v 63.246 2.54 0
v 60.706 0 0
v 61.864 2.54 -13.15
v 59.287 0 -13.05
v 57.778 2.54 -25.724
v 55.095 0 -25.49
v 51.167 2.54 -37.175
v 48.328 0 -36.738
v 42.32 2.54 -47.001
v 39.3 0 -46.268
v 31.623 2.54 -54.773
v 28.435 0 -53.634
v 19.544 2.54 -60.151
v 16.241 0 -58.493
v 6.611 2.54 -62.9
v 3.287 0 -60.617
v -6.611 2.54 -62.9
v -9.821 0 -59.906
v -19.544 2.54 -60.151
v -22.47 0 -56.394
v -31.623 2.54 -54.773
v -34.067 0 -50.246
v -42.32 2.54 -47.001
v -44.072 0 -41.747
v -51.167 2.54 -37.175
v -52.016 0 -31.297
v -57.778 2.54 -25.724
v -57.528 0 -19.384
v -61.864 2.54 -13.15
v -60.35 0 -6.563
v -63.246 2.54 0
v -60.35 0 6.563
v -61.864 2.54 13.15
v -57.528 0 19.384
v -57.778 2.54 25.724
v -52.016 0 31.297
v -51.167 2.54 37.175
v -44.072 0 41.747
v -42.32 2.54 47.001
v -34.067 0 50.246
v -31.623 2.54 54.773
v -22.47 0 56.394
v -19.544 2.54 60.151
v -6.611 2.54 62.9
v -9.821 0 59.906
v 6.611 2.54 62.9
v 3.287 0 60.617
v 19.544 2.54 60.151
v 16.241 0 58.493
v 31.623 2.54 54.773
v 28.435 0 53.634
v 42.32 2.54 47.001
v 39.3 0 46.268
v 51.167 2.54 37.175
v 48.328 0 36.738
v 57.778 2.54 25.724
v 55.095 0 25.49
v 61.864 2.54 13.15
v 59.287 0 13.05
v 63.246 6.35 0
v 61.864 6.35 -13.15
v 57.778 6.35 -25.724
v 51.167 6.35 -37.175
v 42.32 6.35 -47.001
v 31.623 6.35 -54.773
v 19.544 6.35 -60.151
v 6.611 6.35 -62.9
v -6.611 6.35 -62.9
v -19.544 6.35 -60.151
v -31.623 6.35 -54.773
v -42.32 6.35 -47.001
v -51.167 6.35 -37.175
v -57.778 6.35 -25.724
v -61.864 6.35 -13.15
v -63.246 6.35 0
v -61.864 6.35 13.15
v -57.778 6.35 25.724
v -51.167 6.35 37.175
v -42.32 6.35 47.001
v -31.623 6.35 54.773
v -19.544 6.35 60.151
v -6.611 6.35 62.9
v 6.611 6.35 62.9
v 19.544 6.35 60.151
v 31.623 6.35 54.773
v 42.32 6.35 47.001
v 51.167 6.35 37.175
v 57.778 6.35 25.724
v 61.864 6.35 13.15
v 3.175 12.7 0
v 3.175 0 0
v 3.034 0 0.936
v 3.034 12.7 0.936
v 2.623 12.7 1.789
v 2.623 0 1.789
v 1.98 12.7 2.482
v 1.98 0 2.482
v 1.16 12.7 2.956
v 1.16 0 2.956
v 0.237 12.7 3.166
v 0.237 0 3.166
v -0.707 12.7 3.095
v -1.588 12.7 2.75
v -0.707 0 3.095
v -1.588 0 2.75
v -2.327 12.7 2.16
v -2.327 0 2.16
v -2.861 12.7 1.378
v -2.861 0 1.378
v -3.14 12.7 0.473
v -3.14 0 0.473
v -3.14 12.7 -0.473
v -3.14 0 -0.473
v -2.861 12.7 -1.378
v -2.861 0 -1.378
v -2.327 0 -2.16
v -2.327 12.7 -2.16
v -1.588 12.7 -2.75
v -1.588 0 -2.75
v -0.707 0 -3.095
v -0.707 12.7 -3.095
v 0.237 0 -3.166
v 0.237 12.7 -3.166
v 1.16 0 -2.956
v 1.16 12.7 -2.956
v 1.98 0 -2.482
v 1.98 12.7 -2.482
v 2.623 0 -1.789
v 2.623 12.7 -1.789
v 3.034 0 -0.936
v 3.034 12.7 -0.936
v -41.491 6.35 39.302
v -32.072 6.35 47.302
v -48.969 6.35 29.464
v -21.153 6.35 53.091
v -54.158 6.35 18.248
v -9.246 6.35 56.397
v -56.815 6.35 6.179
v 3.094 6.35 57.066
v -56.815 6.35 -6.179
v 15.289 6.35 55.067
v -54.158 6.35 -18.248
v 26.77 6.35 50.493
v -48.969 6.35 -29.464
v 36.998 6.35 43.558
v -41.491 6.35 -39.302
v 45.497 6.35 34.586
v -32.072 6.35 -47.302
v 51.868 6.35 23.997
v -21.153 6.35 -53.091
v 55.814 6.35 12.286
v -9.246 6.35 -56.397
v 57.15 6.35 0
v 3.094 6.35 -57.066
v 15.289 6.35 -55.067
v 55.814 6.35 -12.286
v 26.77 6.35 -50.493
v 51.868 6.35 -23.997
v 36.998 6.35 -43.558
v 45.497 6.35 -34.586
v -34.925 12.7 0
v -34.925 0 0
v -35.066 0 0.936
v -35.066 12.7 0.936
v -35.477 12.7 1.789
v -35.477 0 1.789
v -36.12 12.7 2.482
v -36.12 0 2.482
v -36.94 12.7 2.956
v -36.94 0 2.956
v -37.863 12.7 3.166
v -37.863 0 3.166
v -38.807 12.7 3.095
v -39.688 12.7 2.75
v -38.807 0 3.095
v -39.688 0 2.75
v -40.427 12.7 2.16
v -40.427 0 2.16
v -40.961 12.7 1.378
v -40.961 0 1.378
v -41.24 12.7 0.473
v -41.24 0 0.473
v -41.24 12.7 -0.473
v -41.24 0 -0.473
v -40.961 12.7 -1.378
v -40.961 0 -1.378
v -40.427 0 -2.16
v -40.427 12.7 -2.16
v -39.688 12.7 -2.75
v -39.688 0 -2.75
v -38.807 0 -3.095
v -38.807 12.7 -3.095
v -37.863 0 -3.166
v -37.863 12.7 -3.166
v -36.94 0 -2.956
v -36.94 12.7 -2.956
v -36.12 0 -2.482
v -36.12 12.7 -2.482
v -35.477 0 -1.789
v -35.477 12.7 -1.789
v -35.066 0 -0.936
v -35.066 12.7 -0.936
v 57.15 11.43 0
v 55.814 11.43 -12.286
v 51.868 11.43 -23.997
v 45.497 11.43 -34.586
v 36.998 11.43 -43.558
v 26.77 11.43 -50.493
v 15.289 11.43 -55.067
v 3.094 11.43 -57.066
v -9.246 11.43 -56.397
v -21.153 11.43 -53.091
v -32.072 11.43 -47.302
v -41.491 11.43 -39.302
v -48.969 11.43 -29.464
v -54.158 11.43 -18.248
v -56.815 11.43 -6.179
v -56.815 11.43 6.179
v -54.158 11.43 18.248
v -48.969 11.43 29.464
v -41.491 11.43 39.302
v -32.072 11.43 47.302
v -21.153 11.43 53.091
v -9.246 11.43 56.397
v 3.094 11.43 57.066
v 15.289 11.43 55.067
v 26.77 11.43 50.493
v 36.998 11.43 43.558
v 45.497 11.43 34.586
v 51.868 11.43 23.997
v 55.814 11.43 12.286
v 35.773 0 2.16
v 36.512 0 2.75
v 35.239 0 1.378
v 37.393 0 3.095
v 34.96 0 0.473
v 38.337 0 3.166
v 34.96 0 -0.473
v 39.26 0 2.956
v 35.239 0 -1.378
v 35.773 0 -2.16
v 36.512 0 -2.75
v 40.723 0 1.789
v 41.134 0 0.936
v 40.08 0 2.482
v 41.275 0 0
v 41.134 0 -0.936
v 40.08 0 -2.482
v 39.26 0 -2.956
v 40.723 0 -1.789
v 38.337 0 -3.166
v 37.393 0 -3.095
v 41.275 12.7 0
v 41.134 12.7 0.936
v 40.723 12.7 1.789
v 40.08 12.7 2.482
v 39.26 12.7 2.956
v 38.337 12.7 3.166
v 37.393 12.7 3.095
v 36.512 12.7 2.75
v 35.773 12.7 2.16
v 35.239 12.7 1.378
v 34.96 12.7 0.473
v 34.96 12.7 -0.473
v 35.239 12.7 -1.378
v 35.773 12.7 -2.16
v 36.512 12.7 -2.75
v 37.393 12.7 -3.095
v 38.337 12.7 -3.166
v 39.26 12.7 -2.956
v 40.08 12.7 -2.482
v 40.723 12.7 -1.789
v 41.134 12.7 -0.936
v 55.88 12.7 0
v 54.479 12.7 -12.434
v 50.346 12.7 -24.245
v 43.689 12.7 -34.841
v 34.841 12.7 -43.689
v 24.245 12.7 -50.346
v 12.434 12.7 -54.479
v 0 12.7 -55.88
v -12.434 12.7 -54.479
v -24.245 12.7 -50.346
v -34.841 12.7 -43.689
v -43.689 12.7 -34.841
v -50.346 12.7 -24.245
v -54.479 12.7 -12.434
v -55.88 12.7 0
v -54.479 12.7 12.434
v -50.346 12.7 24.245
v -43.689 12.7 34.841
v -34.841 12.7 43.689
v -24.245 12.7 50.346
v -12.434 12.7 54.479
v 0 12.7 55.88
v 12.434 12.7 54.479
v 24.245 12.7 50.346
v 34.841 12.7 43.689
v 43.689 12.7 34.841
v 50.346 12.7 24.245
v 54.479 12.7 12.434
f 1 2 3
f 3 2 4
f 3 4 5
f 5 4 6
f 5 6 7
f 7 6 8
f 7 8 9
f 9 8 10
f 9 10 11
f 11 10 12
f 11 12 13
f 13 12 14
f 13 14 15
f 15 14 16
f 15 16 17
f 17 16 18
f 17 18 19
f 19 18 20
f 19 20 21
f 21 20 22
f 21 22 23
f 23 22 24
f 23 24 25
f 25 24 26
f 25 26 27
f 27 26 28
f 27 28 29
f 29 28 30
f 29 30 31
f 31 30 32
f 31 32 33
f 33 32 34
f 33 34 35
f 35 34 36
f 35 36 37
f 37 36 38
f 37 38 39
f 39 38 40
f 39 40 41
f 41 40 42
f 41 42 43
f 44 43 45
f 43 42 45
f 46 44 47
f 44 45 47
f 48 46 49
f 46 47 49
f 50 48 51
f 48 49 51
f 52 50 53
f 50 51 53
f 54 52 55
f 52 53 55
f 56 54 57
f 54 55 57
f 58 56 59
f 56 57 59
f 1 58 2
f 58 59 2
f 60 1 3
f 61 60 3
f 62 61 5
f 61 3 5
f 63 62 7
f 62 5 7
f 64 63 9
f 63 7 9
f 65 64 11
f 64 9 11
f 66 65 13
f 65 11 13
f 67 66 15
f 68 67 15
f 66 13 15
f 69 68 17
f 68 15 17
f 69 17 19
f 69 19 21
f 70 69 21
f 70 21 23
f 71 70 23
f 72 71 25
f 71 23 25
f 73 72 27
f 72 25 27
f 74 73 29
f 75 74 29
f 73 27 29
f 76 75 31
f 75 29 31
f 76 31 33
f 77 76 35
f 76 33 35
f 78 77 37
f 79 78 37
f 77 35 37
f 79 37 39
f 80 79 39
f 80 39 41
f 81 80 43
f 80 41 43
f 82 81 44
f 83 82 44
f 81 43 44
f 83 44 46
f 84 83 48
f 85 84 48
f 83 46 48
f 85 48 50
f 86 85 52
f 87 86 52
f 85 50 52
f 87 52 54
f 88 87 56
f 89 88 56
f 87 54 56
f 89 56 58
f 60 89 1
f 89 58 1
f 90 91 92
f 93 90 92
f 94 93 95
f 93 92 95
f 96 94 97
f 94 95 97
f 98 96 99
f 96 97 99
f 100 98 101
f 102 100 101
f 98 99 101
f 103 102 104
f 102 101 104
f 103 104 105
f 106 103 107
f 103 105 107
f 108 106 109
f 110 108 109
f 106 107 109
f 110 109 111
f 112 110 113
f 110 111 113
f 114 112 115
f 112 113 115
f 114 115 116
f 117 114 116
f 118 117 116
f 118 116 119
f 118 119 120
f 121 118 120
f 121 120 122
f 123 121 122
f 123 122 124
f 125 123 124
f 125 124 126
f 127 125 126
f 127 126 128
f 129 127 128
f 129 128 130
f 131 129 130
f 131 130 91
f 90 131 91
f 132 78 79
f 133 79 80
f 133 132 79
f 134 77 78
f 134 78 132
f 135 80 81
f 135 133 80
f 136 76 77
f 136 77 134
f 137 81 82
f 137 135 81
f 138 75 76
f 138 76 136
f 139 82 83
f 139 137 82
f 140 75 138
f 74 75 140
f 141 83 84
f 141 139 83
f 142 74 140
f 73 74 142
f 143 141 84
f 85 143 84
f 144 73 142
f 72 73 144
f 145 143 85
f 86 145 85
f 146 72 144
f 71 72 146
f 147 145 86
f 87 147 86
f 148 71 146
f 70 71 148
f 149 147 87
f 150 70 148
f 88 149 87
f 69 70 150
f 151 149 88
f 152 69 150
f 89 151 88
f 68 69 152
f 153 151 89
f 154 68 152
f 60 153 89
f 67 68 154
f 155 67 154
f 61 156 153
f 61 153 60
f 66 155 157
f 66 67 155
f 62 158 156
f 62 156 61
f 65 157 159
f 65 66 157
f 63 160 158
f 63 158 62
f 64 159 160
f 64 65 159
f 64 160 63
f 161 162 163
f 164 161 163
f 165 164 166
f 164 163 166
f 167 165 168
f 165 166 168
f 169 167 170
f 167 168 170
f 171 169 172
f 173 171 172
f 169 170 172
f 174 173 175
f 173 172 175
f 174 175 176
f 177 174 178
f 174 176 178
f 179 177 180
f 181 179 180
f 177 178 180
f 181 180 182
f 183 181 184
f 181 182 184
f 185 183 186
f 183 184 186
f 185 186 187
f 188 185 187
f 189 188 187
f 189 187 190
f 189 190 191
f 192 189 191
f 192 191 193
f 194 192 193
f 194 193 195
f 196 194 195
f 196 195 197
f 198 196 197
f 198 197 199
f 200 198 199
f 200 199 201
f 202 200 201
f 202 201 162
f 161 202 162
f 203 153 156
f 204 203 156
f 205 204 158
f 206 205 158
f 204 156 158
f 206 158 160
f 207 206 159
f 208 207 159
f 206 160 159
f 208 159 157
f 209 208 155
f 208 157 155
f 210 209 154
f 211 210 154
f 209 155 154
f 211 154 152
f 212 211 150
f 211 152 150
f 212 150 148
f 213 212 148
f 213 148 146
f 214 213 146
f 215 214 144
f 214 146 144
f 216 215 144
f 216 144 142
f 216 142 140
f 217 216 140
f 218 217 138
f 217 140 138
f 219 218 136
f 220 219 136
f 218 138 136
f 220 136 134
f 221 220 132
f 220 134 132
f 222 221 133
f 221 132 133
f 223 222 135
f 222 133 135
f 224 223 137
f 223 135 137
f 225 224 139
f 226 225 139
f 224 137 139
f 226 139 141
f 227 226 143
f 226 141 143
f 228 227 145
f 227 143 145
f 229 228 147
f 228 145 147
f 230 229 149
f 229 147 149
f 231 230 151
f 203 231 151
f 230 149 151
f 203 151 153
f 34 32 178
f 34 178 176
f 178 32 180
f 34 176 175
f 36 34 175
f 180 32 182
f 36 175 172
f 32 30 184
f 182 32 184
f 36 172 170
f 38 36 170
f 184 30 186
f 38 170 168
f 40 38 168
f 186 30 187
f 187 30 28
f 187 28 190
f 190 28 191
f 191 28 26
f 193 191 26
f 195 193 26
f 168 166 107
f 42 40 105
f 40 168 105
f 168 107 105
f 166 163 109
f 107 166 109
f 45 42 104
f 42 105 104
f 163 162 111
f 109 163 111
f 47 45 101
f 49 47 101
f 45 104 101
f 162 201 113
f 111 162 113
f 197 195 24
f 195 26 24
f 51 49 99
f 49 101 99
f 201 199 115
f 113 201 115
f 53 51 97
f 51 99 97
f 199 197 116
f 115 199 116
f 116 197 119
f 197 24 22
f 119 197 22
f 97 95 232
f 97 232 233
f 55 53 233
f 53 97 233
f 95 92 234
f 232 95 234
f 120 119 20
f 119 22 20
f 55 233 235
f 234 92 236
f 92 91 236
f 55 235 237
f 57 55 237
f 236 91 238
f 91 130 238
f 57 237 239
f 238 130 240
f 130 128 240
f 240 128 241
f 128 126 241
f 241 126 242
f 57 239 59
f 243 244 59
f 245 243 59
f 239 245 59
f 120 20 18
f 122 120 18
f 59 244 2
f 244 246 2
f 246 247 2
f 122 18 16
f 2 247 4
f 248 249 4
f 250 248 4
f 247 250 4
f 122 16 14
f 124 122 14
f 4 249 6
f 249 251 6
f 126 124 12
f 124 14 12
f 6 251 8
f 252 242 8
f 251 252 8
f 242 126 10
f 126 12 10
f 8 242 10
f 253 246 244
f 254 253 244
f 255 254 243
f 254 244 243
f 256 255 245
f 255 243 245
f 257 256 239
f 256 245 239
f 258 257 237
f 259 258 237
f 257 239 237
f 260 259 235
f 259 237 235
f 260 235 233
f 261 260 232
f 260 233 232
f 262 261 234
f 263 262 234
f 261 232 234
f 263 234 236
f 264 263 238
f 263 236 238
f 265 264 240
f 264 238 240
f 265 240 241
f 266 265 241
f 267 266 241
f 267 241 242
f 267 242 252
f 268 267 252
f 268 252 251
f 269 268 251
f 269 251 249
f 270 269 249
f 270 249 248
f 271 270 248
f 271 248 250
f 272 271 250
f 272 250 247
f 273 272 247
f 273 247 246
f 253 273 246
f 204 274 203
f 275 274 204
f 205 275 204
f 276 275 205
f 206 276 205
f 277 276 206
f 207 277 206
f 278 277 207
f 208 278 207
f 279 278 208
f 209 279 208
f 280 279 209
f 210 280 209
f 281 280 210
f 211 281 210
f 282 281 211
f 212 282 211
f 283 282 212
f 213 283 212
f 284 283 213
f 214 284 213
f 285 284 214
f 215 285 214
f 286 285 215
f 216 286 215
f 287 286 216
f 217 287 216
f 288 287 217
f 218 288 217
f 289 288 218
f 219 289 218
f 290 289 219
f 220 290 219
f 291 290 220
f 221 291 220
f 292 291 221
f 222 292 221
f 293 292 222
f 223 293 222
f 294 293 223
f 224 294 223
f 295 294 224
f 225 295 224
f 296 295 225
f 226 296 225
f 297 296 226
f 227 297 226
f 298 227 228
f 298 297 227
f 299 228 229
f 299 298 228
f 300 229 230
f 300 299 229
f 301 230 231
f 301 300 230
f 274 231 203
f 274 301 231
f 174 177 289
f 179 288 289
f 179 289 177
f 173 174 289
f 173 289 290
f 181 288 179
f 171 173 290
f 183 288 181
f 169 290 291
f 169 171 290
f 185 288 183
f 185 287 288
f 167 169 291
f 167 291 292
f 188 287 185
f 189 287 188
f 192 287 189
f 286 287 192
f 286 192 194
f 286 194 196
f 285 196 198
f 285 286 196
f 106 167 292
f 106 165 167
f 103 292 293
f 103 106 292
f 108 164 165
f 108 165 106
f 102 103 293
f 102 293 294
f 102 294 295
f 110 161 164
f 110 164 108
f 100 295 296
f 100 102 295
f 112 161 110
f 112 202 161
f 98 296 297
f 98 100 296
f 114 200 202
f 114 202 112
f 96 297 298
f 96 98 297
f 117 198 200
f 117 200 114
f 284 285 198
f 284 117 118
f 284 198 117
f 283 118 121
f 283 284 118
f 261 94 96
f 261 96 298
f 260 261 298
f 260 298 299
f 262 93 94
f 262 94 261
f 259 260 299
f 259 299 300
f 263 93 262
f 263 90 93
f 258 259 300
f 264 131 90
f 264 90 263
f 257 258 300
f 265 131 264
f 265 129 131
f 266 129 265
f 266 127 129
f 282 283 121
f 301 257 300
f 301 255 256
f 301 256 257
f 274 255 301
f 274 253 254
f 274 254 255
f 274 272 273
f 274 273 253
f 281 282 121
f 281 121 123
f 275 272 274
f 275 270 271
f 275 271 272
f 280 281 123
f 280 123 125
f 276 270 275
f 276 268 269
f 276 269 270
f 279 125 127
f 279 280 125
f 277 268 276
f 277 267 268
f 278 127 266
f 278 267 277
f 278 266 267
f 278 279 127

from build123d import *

# Parameters (mm, degrees)
SKETCH1_R           = 63.246
BOSS_EXTRUDE1_DEPTH = 6.35
SKETCH2_R           = 57.15
BOSS_EXTRUDE2_DEPTH = 6.35
CHAMFER1_SIZE       = 1.27
SKETCH4_R           = 3.175
CUT_EXTRUDE1_DEPTH  = 13.7
CHAMFER2_SIZE       = 2.54


with BuildPart() as part:
    # Sketch1 → Boss-Extrude1 (new body)
    with BuildSketch(Plane(origin=(0, 0, 0), x_dir=(1, 0, 0), z_dir=(0, 1, 0))):
        Circle(SKETCH1_R)
    extrude(amount=BOSS_EXTRUDE1_DEPTH)

    # Sketch2 → Boss-Extrude2 (add)
    with BuildSketch(Plane(origin=(0, 6.35, 0), x_dir=(1, 0, 0), z_dir=(0, 1, 0))):
        Circle(SKETCH2_R)
    extrude(amount=BOSS_EXTRUDE2_DEPTH)

    # Chamfer1
    chamfer1_edges = [part.edges().sort_by_distance(p)[0] for p in [
        (-57.15, 12.7, 0),
    ]]
    chamfer(chamfer1_edges, length=CHAMFER1_SIZE)

    # Sketch4 → Cut-Extrude1 (cut, through all)
    with BuildSketch(Plane.XZ):
        with Locations((-38.1, 0)):
            Circle(SKETCH4_R)
        Circle(SKETCH4_R)
        with Locations((38.1, 0)):
            Circle(SKETCH4_R)
    extrude(amount=-CUT_EXTRUDE1_DEPTH, mode=Mode.SUBTRACT)

    # Chamfer2
    chamfer2_edges = [part.edges().sort_by_distance(p)[0] for p in [
        (-63.246, 0, 0),
    ]]
    chamfer(chamfer2_edges, length=CHAMFER2_SIZE)


solid = part.part
